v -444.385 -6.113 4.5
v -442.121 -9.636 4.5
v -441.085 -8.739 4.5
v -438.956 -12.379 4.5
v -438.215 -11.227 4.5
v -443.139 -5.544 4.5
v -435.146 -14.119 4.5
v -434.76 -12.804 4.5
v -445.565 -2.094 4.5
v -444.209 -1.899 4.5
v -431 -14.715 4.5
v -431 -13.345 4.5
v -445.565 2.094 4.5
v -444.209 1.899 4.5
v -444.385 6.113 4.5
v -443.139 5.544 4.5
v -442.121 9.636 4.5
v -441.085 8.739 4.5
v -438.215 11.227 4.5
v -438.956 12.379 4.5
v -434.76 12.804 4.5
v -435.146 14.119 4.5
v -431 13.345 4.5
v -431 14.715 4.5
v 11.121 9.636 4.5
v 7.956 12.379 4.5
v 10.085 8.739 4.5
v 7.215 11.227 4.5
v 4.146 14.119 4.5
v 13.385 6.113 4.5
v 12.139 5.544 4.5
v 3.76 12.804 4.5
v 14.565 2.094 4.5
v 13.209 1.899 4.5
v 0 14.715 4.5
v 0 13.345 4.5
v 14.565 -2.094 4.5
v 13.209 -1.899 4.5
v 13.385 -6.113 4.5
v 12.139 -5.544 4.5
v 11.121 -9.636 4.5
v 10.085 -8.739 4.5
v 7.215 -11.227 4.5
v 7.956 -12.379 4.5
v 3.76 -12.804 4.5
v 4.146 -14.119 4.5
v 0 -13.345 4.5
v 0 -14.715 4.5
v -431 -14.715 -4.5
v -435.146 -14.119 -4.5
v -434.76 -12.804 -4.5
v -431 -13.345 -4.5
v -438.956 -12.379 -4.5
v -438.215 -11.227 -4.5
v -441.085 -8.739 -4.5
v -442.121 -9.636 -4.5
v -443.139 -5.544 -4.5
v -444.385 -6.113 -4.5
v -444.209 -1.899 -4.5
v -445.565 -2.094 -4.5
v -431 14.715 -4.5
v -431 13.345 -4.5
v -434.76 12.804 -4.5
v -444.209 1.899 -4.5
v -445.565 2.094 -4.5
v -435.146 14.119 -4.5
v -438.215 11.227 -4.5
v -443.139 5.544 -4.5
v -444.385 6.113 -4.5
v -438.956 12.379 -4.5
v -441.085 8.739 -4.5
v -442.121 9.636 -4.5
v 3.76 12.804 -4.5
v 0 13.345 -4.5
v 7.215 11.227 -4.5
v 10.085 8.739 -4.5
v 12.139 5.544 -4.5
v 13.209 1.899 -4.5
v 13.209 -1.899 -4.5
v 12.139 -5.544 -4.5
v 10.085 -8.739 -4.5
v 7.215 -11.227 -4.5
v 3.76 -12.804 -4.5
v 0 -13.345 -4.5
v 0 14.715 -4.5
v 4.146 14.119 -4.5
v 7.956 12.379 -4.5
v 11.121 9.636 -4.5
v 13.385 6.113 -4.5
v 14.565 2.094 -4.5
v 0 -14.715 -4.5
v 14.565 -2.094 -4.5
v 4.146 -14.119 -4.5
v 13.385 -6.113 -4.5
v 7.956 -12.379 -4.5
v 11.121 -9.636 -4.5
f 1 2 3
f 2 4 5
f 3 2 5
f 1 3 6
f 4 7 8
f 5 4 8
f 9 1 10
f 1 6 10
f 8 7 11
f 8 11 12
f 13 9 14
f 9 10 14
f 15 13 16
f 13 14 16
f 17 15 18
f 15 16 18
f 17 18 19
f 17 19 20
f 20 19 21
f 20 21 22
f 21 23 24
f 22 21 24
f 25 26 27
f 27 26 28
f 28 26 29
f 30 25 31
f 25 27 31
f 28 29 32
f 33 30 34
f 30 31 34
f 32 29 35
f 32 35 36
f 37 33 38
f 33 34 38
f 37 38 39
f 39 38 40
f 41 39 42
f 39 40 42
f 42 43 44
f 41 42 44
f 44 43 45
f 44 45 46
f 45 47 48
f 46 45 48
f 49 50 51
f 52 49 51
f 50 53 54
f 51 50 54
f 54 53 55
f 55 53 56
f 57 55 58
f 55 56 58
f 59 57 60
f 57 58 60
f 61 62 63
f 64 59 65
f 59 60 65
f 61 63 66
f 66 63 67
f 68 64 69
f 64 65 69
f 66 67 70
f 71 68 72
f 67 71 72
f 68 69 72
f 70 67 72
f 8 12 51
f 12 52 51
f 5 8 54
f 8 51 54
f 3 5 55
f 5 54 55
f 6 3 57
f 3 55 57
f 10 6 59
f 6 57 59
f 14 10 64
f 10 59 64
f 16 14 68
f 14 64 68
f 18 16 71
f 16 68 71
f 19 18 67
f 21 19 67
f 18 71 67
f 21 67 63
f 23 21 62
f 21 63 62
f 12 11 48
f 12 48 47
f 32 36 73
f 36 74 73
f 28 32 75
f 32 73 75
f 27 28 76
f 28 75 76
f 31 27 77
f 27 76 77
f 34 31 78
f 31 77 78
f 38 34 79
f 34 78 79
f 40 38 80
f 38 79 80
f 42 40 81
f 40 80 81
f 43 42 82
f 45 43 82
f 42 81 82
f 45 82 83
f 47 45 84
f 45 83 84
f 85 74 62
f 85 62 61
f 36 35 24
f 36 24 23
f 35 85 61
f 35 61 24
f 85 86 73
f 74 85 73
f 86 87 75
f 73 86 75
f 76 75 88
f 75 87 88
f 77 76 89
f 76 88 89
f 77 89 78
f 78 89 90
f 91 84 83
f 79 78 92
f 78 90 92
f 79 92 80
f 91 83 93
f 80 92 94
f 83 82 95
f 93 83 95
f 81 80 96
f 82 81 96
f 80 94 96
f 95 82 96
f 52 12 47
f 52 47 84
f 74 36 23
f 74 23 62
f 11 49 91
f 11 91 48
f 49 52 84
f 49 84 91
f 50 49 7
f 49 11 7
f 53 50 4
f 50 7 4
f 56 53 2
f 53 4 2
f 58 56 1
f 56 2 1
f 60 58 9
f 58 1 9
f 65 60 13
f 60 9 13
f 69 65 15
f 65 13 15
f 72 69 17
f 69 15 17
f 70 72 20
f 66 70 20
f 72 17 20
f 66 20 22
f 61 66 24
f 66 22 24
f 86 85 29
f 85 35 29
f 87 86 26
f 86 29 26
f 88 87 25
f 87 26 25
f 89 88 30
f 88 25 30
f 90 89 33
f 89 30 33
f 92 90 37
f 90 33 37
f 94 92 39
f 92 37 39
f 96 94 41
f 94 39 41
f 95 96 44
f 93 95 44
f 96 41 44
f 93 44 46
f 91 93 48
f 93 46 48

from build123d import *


with BuildPart() as part:
    # ｽｲｰﾌﾟ1: sweep along a path in ｽｹｯﾁ2
    with BuildLine(Plane.XY) as sweep_1_path:
        Line((0, -13.345), (-431, -13.345))
        ThreePointArc((-431, -13.345), (-444.345, 0), (-431, 13.345))
        Line((-431, 13.345), (0, 13.345))
        ThreePointArc((0, 13.345), (13.345, 0), (0, -13.345))
    # Sketch 3D_3 → ｽｲｰﾌﾟ1 (sweep)
    with BuildSketch(Plane(origin=(0, 13.345, 0), x_dir=(-1.3735006890805393e-13, 0.29124620867342393, -0.956648130679905), z_dir=(1, 0, 0))):
        Polygon((0, 0), (4.304916588, -1.310607939), (4.703923894, 0), (-3.905909282, 2.621215878), (-4.304916588, 1.310607939), align=None)
    sweep(path=sweep_1_path.line)


solid = part.part
